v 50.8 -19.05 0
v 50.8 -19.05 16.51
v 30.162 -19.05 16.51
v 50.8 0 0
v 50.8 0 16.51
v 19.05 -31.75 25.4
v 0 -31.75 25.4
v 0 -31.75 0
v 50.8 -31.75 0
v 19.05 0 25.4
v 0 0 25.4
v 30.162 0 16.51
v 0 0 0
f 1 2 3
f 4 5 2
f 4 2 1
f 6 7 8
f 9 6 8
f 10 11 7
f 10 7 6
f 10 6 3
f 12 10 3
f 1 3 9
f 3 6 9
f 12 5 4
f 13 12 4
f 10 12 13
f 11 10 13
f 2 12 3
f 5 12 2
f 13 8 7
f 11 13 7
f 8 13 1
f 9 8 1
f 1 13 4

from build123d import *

# Parameters (mm, degrees)
F0_W     = 50.8
F0_H     = 25.4
F1_DEPTH = 31.75
F3_DEPTH = 31.75
F5_DEPTH = 19.05


with BuildPart() as f1:
    # F0 (on Front) → F1 (new body)
    with BuildSketch(Plane.XZ):
        with Locations((25.4, 12.7)):
            Rectangle(F0_W, F0_H)
    extrude(amount=F1_DEPTH)

    # F2 (on face) → F3 (cut)
    with BuildSketch(Plane.XZ.offset(31.75)):
        Polygon((50.8, 25.4), (19.05, 25.4), (50.8, 0), align=None)
    extrude(amount=-F3_DEPTH, mode=Mode.SUBTRACT)

    # F4 (on face) → F5 (join)
    with BuildSketch(Plane(origin=(0, 0, 0), x_dir=(-1, 0, 0), z_dir=(0, 1, 0))):
        Polygon((-50.8, 16.51), (-50.8, 0), (-30.1625, 16.51), align=None)
    extrude(amount=-F5_DEPTH)


solid = f1.part
